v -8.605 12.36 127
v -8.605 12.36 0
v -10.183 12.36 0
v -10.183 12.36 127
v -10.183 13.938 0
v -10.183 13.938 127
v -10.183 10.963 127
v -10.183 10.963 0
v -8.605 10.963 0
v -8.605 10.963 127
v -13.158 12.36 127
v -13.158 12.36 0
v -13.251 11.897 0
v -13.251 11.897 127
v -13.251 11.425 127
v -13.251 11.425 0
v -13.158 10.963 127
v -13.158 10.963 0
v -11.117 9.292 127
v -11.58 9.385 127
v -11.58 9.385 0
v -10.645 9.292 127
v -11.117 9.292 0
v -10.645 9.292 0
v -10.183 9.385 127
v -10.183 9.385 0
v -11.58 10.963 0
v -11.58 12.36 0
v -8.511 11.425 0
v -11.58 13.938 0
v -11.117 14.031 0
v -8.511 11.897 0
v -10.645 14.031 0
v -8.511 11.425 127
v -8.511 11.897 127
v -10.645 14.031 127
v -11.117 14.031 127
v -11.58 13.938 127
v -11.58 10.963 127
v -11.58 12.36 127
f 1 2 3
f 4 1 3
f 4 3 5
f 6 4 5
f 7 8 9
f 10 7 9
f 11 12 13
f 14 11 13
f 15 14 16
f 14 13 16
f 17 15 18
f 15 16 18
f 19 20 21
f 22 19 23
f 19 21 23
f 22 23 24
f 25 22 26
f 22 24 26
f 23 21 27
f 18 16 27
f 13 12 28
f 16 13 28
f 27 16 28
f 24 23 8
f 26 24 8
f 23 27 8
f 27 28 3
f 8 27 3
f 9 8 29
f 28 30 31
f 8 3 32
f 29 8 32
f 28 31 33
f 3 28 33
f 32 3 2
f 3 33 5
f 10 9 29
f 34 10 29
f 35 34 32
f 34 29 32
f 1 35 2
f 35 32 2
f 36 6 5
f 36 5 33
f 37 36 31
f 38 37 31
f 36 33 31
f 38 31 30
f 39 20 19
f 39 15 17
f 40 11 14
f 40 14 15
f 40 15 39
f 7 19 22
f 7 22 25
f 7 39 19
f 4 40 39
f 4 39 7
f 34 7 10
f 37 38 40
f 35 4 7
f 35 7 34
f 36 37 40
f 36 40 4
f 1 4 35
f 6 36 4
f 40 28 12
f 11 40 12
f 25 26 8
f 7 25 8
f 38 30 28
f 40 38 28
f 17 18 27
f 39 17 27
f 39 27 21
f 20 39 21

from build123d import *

# Parameters (mm, degrees)
F1_DEPTH = 127


with BuildPart() as f1:
    # F0 (on Top) → F1 (new body)
    with BuildSketch(Plane.XY):
        with BuildLine():
            Line((-11.57952, 10.962582), (-11.57952, 9.384583))
            ThreePointArc((-11.57952, 9.384583), (-10.88102, 9.279832), (-10.18252, 9.384583))
            Line((-10.18252, 9.384583), (-10.18252, 10.962582))
            Line((-10.18252, 10.962582), (-8.604521, 10.962582))
            ThreePointArc((-8.604521, 10.962582), (-8.49977, 11.661082), (-8.604521, 12.359582))
            Line((-8.604521, 12.359582), (-10.18252, 12.359582))
            Line((-10.18252, 12.359582), (-10.18252, 13.937582))
            ThreePointArc((-10.18252, 13.937582), (-10.88102, 14.042332), (-11.57952, 13.937582))
            Line((-11.57952, 13.937582), (-11.57952, 12.359582))
            Line((-11.57952, 12.359582), (-13.157519, 12.359582))
            ThreePointArc((-13.157519, 12.359582), (-13.26227, 11.661082), (-13.157519, 10.962582))
            Line((-13.157519, 10.962582), (-11.57952, 10.962582))
        make_face()
    extrude(amount=F1_DEPTH)


solid = f1.part
